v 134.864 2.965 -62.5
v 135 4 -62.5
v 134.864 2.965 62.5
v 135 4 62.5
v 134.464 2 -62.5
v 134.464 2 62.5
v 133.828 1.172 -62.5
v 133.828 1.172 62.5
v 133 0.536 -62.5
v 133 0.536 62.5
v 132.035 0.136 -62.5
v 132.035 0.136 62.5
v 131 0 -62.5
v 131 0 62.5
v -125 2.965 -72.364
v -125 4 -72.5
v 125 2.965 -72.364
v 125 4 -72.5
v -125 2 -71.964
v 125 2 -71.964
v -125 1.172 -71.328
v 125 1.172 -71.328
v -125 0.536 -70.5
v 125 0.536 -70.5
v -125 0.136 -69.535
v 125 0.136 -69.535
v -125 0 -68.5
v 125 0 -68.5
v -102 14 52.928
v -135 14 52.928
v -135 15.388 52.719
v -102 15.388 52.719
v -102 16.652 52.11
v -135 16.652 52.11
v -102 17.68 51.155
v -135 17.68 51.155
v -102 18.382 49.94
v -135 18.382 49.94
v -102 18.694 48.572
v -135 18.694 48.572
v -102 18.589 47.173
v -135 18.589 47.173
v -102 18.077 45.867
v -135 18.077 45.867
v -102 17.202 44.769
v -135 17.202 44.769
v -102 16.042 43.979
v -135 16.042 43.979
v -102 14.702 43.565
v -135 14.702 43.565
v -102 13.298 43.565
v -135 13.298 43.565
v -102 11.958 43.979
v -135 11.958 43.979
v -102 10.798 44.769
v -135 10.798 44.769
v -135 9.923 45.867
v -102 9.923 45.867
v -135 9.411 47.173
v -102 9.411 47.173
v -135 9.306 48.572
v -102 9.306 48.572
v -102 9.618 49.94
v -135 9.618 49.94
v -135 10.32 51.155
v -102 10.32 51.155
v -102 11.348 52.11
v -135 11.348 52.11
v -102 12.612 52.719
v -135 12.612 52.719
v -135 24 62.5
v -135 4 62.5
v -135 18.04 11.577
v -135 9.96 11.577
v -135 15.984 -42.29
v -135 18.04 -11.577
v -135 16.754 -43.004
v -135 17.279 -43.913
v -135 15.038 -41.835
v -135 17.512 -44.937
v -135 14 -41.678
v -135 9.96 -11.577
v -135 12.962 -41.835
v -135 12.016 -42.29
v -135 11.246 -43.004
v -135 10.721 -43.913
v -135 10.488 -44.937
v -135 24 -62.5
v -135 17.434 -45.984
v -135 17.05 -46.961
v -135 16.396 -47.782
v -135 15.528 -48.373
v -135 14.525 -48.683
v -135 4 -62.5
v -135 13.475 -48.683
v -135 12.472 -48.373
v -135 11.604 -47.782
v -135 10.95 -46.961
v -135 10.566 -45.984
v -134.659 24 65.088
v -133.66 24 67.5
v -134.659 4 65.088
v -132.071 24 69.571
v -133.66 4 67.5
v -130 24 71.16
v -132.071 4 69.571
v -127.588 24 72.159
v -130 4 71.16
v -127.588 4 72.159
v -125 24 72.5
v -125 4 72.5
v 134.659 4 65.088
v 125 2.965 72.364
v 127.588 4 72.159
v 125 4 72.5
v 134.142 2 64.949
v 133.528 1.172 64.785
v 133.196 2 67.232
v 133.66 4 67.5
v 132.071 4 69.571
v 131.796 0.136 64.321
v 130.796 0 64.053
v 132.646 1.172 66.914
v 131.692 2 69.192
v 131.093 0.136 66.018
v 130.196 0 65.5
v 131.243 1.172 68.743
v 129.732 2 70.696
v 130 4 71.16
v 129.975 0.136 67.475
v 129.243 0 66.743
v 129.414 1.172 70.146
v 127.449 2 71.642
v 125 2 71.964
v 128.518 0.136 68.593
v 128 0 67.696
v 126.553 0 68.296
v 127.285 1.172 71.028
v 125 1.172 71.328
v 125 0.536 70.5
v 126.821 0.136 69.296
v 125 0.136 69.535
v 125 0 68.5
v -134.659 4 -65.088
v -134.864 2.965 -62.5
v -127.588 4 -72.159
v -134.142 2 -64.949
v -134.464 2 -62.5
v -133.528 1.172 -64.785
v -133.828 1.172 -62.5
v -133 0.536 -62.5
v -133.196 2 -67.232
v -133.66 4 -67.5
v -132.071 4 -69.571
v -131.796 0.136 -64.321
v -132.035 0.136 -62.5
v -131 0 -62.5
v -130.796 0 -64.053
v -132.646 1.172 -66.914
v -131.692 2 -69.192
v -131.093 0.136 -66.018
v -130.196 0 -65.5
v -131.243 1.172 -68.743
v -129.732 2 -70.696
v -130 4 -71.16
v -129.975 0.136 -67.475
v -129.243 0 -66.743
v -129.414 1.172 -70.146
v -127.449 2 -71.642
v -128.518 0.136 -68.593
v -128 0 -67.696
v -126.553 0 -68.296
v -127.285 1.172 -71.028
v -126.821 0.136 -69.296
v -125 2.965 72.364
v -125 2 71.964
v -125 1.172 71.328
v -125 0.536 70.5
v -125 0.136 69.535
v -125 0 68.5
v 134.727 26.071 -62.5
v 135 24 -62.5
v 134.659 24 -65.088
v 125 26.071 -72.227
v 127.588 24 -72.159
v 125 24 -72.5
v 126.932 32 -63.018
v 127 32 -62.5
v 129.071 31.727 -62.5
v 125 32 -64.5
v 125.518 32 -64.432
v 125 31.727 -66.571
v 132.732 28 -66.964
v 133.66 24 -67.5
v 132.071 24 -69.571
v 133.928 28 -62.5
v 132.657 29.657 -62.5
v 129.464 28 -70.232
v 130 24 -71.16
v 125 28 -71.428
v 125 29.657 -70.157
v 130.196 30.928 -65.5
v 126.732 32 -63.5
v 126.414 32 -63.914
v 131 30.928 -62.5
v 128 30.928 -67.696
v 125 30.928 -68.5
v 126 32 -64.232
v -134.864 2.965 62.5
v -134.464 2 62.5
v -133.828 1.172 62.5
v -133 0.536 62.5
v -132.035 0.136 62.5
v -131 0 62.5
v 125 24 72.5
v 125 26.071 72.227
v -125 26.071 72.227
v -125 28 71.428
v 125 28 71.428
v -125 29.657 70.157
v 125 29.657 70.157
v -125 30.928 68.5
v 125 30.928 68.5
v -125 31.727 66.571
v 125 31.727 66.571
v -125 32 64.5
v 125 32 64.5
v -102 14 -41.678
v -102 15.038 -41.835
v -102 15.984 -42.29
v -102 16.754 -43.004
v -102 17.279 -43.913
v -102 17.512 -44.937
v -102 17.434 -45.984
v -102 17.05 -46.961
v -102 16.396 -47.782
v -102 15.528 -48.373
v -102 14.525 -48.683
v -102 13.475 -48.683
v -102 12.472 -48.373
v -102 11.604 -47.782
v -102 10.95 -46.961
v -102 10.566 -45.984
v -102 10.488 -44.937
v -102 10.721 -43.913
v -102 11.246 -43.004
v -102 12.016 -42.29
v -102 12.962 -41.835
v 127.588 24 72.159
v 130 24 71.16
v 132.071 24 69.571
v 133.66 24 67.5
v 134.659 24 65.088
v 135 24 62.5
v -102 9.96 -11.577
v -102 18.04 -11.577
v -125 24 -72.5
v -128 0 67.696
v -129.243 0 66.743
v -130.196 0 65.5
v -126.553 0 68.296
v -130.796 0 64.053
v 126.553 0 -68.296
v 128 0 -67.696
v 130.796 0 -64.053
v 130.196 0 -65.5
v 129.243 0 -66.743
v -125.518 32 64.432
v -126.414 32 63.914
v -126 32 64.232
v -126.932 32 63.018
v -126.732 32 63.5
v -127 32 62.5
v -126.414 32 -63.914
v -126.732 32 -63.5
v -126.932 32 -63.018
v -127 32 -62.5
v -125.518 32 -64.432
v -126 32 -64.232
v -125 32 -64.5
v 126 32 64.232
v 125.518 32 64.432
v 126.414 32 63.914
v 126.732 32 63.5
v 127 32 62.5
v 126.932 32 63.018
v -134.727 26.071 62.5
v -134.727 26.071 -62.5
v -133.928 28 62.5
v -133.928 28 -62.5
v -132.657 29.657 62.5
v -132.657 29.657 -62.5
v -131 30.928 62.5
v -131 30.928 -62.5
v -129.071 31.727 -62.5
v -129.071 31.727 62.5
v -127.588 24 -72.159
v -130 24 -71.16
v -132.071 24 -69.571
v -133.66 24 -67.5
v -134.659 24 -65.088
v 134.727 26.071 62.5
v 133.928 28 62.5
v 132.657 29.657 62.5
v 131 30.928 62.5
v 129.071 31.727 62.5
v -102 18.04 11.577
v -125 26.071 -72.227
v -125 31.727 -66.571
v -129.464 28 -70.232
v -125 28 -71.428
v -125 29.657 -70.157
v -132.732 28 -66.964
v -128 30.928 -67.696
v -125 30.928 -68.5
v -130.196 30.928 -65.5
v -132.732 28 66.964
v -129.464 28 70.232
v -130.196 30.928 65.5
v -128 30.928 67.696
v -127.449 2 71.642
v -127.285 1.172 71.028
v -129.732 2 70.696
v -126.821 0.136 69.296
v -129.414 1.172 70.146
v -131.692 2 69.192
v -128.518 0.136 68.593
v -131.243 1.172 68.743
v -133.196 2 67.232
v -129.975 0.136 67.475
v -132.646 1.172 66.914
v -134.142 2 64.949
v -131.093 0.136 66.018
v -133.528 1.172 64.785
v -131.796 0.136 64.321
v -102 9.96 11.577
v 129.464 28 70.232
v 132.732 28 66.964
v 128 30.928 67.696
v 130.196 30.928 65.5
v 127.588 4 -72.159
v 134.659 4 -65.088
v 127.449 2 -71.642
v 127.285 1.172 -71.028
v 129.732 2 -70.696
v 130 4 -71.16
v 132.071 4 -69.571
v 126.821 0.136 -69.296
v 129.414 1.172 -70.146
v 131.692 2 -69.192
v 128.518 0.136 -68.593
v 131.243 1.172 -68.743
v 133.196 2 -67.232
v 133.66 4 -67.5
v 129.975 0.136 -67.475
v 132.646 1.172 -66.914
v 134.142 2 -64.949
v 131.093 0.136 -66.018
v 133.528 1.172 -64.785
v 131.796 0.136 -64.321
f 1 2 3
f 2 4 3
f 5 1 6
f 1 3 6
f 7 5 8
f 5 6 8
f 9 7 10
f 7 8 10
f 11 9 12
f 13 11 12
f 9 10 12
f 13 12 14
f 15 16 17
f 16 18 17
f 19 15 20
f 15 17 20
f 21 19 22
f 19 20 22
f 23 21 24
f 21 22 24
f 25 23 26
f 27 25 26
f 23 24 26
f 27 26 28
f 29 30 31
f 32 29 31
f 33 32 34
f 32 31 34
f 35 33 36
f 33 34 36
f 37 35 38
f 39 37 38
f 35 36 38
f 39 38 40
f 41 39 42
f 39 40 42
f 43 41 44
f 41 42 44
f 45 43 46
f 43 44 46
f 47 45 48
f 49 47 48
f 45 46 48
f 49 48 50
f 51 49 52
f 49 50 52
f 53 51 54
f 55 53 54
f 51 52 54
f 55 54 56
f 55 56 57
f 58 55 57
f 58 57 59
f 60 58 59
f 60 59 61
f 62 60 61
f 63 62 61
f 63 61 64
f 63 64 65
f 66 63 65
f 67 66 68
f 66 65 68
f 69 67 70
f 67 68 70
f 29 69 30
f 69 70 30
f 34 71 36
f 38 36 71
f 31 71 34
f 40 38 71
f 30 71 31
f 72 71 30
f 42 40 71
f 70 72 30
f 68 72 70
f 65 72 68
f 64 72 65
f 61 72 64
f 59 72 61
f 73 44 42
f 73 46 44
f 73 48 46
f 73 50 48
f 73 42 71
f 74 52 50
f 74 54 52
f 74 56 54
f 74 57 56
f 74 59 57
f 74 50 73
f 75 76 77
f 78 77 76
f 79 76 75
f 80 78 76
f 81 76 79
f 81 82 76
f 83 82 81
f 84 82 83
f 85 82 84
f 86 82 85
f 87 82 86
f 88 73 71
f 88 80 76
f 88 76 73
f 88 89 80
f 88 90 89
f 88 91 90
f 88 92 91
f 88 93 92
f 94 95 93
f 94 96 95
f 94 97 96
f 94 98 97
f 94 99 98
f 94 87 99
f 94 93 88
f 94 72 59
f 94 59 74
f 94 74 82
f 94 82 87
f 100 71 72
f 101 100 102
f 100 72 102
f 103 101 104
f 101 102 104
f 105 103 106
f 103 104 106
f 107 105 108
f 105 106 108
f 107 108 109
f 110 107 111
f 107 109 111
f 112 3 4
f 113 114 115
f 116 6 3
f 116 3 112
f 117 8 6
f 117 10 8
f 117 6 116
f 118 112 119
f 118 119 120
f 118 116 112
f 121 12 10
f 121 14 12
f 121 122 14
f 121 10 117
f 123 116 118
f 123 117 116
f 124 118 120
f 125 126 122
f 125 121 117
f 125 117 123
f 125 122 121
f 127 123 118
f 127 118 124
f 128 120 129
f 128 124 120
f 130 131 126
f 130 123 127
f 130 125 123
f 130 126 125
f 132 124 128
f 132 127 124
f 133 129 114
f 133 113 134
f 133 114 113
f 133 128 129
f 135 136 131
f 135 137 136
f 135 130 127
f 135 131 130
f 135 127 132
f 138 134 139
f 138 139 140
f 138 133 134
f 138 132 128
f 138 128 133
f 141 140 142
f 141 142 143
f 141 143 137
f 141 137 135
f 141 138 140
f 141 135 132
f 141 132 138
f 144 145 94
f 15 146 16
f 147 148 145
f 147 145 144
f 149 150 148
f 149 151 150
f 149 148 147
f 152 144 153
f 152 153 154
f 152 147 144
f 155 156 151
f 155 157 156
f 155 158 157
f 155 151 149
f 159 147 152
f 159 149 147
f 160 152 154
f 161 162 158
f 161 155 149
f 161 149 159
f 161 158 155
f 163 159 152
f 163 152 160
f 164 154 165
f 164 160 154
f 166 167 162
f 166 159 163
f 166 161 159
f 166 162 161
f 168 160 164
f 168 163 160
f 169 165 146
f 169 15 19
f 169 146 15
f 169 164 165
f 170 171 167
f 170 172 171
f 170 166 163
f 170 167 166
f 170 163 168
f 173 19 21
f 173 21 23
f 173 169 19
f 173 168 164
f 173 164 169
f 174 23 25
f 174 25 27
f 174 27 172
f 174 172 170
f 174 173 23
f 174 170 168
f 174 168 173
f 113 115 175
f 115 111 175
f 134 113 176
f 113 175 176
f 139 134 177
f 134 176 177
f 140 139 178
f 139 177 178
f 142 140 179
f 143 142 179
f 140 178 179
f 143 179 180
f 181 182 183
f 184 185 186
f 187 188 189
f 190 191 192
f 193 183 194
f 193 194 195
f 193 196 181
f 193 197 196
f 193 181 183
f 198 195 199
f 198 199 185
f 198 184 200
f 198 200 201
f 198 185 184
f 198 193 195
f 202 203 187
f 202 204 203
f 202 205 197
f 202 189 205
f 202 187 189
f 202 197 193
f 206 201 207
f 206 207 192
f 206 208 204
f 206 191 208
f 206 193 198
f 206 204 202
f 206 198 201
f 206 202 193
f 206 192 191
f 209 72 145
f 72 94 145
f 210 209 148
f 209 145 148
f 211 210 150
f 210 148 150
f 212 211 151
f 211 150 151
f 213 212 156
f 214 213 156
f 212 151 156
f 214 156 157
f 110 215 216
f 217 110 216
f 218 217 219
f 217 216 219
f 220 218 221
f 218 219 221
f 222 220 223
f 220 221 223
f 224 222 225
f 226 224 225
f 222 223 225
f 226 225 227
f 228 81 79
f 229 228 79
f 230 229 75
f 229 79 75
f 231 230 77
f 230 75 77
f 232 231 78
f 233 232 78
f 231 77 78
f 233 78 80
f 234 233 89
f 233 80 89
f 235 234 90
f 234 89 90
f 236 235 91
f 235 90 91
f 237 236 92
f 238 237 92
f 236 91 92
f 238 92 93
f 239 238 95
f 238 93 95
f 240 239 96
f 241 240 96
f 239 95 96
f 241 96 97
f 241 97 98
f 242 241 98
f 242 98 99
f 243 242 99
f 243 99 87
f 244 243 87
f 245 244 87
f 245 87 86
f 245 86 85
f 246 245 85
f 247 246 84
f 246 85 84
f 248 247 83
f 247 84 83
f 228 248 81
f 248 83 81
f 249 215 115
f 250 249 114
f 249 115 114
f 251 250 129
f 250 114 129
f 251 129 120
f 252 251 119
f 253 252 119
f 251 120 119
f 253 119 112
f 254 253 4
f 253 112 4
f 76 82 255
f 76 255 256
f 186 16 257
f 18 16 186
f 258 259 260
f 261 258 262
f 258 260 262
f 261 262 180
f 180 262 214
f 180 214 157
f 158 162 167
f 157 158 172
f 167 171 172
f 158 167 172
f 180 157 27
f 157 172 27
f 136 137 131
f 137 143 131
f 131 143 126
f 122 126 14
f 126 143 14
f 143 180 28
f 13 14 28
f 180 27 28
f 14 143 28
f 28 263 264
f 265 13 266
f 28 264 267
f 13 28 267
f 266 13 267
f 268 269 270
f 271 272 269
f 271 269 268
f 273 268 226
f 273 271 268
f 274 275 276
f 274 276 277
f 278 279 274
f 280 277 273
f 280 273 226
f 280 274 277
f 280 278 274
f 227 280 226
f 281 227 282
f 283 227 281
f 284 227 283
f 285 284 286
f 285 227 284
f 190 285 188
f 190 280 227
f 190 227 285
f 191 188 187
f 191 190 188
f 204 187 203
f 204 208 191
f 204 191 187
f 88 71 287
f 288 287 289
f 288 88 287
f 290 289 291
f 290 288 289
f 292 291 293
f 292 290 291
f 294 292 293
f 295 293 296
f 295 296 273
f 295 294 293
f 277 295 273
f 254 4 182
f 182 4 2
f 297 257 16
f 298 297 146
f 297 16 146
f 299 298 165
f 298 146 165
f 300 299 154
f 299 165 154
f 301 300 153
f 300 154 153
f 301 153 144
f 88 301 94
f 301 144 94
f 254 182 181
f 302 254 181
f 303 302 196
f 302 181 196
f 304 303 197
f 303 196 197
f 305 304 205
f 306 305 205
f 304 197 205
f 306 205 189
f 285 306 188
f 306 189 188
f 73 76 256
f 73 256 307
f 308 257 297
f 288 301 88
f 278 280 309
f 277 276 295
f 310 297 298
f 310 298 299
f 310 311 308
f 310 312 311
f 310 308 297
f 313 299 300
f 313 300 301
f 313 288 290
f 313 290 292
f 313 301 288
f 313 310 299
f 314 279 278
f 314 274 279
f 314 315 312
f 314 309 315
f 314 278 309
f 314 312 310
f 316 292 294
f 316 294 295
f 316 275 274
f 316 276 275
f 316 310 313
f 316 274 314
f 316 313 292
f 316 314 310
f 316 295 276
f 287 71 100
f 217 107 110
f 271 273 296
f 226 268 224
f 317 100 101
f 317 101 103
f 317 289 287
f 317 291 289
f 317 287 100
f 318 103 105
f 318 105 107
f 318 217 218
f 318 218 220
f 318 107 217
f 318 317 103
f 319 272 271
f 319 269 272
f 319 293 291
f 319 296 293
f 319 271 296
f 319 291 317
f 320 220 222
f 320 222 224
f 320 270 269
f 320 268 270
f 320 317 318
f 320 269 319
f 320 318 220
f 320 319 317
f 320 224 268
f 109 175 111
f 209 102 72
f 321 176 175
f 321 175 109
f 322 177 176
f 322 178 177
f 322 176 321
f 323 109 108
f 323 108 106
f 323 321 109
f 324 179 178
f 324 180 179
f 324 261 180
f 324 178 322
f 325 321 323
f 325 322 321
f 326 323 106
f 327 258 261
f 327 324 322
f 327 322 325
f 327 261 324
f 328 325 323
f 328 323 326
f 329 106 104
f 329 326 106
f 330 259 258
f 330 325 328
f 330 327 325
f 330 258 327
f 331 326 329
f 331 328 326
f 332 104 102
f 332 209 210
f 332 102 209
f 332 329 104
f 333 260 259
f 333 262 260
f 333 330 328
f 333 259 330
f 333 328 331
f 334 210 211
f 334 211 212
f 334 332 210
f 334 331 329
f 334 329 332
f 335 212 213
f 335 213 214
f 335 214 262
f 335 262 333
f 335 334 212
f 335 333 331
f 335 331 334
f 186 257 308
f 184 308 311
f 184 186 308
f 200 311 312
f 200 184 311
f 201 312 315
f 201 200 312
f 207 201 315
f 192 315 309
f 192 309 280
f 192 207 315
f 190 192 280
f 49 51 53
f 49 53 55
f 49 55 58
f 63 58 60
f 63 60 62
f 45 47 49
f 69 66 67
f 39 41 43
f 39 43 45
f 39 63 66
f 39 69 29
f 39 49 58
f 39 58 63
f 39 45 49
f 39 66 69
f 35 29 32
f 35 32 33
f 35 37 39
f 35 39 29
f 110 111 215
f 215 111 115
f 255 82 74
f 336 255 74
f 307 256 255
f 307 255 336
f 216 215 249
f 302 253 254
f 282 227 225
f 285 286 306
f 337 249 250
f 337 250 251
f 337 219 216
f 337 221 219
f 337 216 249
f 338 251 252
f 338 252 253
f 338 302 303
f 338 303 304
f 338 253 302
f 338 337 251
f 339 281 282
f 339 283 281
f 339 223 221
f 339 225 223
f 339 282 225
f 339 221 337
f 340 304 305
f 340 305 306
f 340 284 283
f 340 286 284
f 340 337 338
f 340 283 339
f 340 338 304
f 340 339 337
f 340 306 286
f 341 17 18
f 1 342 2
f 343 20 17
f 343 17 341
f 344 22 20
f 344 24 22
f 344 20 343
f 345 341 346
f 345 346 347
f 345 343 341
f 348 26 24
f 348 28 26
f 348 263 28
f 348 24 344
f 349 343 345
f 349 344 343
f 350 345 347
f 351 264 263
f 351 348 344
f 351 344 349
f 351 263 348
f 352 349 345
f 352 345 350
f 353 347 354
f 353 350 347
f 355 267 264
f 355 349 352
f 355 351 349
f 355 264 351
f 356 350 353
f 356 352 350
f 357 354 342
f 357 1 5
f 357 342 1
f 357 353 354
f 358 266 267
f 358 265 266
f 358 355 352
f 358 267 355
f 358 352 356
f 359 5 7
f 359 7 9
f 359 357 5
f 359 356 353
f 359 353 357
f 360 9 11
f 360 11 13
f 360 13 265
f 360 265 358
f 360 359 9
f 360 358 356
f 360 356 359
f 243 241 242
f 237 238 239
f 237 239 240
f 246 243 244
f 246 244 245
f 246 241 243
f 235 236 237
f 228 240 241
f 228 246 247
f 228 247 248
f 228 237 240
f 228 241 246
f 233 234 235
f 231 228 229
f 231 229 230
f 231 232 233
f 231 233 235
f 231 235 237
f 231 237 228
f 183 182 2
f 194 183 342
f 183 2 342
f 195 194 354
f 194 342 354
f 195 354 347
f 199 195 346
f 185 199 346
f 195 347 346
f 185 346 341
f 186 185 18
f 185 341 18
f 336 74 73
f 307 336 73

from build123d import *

# Parameters (mm, degrees)
SKETCH1_W           = 270
SKETCH1_H           = 145
BOSS_EXTRUDE1_DEPTH = 32
FILLET1_R           = 8
FILLET2_R           = 10
FILLET3_R           = 4
SKETCH2_R           = 3.521962556
SKETCH2_R_2         = 4.707421484
SKETCH2_W           = 23.153777818
SKETCH2_H           = 8.080231906
CUT_EXTRUDE1_DEPTH  = 33


with BuildPart() as part:
    # Sketch1 → Boss-Extrude1 (new body)
    with BuildSketch(Plane(origin=(0, 0, 0), x_dir=(1, 0, 0), z_dir=(0, 1, 0))):
        Rectangle(SKETCH1_W, SKETCH1_H)
    extrude(amount=BOSS_EXTRUDE1_DEPTH)

    # Fillet1
    fillet1_edges = [part.edges().sort_by_distance(p)[0] for p in [
        (-135, 32, 0),
        (0, 32, 72.5),
        (135, 32, 0),
        (0, 32, -72.5),
    ]]
    fillet(fillet1_edges, radius=FILLET1_R)

    # Fillet2
    # the kernel refuses this fillet: 10 mm, written as the material it takes off along each edge
    with BuildSketch(Plane(origin=(-125, 32, 62.5), x_dir=(-1, 0, 0), z_dir=(0, 0, -1))) as fillet2_piece_1:
        with BuildLine():
            CenterArc((2, -8), 8, 0, 90)
            Line((10, -8), (10, 0))
            Line((10, 0), (2, 0))
        make_face()
    revolve(axis=Axis((-125, 32, 62.5), (0, 1, 0)), revolution_arc=90, mode=Mode.SUBTRACT)
    with BuildSketch(Plane(origin=(-125, 32, -62.5), x_dir=(0, 0, -1), z_dir=(1, 0, 0))) as fillet2_piece_2:
        with BuildLine():
            CenterArc((2, -8), 8, 0, 90)
            Line((10, -8), (10, 0))
            Line((10, 0), (2, 0))
        make_face()
    revolve(axis=Axis((-125, 32, -62.5), (0, 1, 0)), revolution_arc=90, mode=Mode.SUBTRACT)
    with BuildSketch(Plane(origin=(125, 32, 62.5), x_dir=(0, 0, 1), z_dir=(-1, 0, 0))) as fillet2_piece_3:
        with BuildLine():
            CenterArc((2, -8), 8, 0, 90)
            Line((10, -8), (10, 0))
            Line((10, 0), (2, 0))
        make_face()
    revolve(axis=Axis((125, 32, 62.5), (0, 1, 0)), revolution_arc=90, mode=Mode.SUBTRACT)
    with BuildSketch(Plane(origin=(125, 32, -62.5), x_dir=(1, 0, 0), z_dir=(0, 0, 1))) as fillet2_piece_4:
        with BuildLine():
            CenterArc((2, -8), 8, 0, 90)
            Line((10, -8), (10, 0))
            Line((10, 0), (2, 0))
        make_face()
    revolve(axis=Axis((125, 32, -62.5), (0, 1, 0)), revolution_arc=90, mode=Mode.SUBTRACT)
    with BuildSketch(Plane(origin=(135, -25, -72.5), x_dir=(-1, 0, 0), z_dir=(0, 1, 0)), Plane(origin=(135, -25, 72.5), x_dir=(0, 0, -1), z_dir=(0, 1, 0))) as fillet2_piece_5:
        with BuildLine():
            CenterArc((FILLET2_R, FILLET2_R), FILLET2_R, 180, 90)
            Line((0, FILLET2_R), (0, 0))
            Line((0, 0), (FILLET2_R, 0))
        make_face()
    extrude(amount=57, mode=Mode.SUBTRACT)
    with BuildSketch(Plane(origin=(-135, -25, -72.5), x_dir=(1, 0, 0), z_dir=(0, 1, 0)), Plane(origin=(-135, -25, 72.5), x_dir=(0, 0, -1), z_dir=(0, 1, 0))) as fillet2_piece_6:
        with BuildLine():
            CenterArc((FILLET2_R, -FILLET2_R), FILLET2_R, 90, 90)
            Line((0, -FILLET2_R), (0, 0))
            Line((0, 0), (FILLET2_R, 0))
        make_face()
    extrude(amount=57, mode=Mode.SUBTRACT)

    # Fillet3
    fillet3_edges = [part.edges().sort_by_distance(p)[0] for p in [
        (-135, 0, 0),
        (135, 0, 0),
        (0, 0, 72.5),
        (0, 0, -72.5),
        (132.071067812, 0, 69.571067812),
        (132.071067812, 0, -69.571067812),
        (-132.071067812, 0, 69.571067812),
        (-132.071067812, 0, -69.571067812),
    ]]
    fillet(fillet3_edges, radius=FILLET3_R)

    # Sketch2 → Cut-Extrude1 (cut)
    with BuildSketch(Plane.ZY.offset(135)):
        with Locations((-45.200201046, 14)):
            Circle(SKETCH2_R)
        with Locations((48.220259023, 14)):
            Circle(SKETCH2_R_2)
        with Locations((0, 14)):
            Rectangle(SKETCH2_W, SKETCH2_H)
    extrude(amount=-CUT_EXTRUDE1_DEPTH, mode=Mode.SUBTRACT)


solid = part.part
